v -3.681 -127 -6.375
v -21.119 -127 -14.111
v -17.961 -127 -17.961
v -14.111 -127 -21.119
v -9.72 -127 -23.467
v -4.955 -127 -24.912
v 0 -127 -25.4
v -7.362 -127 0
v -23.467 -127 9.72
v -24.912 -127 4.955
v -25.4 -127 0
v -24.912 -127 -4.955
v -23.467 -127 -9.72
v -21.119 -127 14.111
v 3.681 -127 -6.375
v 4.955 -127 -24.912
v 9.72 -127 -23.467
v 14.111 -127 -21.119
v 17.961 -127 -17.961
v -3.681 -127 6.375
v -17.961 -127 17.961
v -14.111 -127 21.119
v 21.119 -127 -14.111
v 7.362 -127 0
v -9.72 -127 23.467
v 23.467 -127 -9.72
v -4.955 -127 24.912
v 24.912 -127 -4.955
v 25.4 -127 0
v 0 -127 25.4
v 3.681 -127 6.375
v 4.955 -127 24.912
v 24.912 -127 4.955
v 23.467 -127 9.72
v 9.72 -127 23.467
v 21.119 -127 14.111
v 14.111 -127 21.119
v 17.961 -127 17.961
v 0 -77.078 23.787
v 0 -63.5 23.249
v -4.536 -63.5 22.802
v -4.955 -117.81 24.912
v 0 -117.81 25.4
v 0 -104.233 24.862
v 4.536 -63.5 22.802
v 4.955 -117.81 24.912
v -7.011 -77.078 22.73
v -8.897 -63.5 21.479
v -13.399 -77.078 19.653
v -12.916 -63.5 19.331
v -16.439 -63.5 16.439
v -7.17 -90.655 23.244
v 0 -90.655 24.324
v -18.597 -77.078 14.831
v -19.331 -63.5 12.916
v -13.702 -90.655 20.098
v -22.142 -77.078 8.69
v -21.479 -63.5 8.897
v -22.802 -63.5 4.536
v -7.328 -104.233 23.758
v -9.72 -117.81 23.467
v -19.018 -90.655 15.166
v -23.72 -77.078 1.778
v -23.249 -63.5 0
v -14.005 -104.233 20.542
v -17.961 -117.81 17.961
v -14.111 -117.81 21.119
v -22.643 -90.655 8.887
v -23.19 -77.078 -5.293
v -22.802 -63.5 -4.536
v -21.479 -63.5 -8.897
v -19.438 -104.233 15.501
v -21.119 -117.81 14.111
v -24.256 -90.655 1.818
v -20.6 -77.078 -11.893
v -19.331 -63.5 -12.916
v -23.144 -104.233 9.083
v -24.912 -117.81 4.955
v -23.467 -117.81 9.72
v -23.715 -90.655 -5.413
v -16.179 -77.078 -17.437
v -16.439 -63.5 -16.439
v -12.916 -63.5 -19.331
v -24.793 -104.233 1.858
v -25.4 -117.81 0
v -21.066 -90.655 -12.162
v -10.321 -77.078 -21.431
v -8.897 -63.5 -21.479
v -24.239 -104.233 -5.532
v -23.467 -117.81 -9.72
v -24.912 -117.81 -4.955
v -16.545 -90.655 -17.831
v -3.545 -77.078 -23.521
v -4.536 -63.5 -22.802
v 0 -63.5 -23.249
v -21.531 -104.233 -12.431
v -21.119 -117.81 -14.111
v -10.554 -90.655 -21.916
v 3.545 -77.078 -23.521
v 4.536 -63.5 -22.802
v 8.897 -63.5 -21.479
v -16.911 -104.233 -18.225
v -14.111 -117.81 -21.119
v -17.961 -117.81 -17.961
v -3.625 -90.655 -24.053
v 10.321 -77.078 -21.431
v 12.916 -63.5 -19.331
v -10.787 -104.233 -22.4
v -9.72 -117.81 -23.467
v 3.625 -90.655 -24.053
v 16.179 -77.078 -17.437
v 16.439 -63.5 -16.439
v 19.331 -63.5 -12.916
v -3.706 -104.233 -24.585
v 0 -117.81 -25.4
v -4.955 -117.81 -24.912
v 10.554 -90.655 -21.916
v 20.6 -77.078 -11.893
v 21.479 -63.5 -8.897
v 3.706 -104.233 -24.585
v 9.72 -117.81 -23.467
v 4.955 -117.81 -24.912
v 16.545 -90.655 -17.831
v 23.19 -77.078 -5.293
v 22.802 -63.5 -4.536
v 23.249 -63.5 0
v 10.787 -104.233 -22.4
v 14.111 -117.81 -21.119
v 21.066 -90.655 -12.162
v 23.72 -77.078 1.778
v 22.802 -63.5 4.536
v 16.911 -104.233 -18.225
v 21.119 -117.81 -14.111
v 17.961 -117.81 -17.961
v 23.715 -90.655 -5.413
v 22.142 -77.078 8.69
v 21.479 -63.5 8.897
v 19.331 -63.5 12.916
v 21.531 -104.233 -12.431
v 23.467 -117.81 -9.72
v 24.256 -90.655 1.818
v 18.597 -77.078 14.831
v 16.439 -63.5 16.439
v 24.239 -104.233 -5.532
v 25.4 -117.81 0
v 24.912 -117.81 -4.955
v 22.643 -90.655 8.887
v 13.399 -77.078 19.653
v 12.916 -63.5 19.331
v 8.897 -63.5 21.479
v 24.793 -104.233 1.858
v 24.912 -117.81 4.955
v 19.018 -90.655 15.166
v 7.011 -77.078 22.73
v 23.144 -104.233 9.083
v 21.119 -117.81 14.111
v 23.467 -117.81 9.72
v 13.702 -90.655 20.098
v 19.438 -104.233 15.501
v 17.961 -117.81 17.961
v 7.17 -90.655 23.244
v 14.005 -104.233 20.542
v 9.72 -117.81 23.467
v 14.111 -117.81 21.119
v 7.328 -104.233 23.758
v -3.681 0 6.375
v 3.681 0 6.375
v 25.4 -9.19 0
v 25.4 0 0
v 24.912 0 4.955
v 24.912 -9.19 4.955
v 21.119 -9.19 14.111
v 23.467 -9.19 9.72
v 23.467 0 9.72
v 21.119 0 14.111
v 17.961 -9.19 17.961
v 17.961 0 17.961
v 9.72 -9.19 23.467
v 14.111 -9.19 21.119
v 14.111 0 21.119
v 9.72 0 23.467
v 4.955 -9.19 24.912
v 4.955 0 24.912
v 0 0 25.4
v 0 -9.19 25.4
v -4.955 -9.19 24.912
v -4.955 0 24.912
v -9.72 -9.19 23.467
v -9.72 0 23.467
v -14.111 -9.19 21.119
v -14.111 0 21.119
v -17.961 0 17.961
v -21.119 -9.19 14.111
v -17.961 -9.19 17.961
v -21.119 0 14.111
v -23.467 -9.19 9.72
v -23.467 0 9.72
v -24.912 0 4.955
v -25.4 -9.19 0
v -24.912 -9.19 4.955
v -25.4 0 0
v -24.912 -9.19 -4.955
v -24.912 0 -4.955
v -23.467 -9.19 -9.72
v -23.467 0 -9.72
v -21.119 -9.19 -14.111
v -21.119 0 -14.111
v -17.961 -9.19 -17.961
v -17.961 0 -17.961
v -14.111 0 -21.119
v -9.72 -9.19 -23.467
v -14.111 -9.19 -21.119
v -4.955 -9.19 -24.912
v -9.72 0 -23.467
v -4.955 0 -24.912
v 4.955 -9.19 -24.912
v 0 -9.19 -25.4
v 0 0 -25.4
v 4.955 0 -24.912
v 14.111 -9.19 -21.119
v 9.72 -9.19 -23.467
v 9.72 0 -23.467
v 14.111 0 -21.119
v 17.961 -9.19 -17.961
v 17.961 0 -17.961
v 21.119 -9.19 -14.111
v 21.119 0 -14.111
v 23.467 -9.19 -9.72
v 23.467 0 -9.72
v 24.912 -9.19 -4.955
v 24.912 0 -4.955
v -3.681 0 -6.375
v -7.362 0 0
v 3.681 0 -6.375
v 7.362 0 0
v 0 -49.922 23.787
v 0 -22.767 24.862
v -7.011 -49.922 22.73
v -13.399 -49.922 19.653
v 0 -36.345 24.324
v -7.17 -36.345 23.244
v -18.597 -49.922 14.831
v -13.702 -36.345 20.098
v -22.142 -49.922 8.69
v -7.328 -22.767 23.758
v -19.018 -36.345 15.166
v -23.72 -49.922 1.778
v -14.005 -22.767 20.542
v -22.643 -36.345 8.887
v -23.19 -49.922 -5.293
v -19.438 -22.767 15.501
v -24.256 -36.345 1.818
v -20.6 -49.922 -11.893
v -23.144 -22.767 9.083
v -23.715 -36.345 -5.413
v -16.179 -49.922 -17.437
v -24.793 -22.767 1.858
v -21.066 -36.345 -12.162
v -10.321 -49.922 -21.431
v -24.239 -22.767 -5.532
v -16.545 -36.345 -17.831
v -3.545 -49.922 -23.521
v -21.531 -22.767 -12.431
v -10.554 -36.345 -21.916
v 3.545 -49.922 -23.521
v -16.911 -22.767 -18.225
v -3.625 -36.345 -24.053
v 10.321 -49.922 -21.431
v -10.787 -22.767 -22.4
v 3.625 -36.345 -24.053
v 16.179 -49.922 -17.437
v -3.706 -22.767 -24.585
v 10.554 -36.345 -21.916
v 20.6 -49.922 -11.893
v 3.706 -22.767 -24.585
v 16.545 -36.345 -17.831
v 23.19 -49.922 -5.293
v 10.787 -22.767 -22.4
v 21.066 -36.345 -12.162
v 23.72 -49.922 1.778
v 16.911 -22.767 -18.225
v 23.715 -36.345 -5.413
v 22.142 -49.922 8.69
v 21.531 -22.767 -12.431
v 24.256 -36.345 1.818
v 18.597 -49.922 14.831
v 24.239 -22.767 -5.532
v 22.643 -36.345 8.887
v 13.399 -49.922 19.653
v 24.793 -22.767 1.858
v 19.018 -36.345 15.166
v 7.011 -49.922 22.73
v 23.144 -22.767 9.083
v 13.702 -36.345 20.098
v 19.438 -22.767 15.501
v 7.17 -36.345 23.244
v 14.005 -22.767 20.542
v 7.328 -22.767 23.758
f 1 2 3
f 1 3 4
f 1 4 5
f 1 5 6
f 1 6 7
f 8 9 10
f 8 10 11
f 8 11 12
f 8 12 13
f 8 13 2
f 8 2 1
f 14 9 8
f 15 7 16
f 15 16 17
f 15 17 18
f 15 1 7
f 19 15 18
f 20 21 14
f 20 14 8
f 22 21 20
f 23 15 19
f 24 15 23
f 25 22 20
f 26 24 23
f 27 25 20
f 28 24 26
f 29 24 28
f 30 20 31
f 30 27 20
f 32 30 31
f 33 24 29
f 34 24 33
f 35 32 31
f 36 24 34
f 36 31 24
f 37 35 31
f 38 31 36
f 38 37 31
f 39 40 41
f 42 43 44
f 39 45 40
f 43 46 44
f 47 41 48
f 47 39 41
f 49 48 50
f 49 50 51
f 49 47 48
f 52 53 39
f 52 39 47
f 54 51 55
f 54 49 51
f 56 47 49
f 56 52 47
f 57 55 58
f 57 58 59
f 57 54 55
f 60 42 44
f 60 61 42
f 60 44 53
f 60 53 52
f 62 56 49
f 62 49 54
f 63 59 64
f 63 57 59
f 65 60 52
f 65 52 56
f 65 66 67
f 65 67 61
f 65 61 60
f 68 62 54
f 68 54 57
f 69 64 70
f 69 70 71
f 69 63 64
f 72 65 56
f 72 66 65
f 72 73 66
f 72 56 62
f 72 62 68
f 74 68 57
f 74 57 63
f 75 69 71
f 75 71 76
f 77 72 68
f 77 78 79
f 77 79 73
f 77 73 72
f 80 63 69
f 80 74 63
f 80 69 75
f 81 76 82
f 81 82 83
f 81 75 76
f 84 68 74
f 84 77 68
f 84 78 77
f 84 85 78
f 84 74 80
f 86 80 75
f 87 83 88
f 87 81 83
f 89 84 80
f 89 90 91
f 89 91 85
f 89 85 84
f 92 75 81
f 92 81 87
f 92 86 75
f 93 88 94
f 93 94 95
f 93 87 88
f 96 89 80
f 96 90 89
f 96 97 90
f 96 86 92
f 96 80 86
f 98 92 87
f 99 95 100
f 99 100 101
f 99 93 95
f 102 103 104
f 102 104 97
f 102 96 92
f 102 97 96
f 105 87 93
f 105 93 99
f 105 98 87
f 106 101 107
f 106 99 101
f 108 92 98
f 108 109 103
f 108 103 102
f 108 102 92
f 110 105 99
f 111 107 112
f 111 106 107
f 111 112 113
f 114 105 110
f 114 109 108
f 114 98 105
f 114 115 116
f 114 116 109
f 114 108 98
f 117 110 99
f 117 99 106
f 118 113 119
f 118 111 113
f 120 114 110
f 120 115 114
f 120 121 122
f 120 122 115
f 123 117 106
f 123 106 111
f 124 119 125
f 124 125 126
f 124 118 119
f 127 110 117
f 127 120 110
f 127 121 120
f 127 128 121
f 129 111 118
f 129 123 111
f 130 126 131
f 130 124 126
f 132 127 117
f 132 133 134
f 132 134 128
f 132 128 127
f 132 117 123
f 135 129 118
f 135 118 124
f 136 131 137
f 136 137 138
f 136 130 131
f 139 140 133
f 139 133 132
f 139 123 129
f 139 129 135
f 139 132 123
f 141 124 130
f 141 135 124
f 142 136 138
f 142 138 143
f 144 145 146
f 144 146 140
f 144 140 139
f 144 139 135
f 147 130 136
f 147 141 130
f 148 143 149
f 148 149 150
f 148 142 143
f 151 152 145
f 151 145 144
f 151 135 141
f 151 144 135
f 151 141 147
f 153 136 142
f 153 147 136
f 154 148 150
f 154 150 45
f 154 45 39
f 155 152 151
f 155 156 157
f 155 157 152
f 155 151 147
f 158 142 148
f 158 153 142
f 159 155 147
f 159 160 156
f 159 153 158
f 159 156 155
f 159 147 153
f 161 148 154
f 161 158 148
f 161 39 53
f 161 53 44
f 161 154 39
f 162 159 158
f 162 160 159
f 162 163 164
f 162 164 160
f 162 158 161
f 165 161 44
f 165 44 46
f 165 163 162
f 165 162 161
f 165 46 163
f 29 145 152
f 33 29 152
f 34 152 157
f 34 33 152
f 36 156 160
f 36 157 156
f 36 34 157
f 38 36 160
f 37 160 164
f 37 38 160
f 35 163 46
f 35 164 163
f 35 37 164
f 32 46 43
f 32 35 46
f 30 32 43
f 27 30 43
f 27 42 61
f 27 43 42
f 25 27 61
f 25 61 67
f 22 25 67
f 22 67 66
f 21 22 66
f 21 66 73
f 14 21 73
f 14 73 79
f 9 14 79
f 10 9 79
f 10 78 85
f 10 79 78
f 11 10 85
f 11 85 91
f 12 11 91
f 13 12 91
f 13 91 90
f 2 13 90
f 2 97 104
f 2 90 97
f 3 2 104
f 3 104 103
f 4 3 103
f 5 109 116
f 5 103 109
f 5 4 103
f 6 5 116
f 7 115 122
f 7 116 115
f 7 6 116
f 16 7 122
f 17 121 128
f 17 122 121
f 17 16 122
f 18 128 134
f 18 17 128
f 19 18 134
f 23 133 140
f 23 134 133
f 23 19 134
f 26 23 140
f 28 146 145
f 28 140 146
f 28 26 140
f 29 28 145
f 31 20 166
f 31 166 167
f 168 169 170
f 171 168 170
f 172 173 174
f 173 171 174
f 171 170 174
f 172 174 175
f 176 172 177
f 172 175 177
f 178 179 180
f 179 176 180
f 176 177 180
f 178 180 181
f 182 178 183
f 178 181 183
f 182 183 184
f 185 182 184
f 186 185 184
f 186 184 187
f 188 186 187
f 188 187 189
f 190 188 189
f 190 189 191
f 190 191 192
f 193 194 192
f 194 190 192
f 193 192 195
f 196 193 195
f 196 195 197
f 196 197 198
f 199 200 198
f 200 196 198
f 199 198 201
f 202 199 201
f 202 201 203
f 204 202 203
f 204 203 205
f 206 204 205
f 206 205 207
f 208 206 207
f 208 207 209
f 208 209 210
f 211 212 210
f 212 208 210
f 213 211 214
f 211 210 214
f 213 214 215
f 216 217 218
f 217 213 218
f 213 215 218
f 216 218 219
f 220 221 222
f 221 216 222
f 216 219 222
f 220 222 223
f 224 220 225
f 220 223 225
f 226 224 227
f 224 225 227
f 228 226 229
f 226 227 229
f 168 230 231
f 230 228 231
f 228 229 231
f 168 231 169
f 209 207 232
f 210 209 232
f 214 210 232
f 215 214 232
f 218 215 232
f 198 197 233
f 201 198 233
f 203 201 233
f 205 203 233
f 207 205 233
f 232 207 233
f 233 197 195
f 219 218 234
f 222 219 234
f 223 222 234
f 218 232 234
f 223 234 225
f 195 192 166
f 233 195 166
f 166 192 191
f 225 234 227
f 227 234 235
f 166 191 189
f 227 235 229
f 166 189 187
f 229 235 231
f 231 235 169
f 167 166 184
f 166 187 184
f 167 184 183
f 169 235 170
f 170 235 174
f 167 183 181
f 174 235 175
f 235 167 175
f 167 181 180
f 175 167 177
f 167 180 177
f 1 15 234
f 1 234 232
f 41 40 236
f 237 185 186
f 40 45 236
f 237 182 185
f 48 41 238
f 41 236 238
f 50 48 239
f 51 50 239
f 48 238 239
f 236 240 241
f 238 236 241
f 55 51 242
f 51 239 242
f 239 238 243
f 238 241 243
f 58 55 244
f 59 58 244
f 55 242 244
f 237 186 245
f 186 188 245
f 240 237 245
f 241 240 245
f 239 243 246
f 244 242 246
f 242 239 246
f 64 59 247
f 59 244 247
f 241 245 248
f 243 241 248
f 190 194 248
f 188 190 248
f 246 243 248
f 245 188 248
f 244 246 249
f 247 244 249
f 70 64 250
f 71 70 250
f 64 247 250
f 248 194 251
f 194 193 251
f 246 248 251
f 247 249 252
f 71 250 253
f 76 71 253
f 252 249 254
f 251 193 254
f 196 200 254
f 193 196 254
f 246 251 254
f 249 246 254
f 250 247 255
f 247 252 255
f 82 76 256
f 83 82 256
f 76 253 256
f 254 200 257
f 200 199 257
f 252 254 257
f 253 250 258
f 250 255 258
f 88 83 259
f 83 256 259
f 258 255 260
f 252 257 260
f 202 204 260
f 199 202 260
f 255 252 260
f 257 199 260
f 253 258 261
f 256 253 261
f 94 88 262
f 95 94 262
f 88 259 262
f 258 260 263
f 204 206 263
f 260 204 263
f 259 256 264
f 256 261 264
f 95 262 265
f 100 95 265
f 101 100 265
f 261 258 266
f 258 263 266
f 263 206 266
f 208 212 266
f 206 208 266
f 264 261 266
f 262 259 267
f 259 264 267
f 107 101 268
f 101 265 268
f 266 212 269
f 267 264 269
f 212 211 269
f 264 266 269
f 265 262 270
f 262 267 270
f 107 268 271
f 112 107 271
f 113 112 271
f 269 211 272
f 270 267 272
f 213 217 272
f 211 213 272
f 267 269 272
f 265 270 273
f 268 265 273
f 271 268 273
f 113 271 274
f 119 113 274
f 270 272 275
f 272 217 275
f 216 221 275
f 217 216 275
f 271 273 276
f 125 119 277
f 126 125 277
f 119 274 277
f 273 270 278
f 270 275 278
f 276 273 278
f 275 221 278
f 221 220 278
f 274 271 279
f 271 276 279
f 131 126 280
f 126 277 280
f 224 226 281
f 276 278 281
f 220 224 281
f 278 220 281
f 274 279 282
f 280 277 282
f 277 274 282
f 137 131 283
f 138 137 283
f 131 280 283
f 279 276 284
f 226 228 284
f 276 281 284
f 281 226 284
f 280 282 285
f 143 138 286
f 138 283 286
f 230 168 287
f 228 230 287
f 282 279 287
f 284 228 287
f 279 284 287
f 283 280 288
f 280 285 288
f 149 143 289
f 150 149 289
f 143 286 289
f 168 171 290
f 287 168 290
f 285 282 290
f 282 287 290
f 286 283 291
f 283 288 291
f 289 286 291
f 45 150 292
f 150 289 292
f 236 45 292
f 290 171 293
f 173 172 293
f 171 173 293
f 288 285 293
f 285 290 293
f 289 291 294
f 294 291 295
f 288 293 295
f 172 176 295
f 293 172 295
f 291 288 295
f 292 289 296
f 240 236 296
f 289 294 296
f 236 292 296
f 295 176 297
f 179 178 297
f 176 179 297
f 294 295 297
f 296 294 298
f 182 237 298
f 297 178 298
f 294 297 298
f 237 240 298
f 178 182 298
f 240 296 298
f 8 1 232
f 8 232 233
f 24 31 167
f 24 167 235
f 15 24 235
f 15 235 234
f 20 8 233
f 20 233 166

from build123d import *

# Parameters (mm, degrees)
F0_R     = 25.4
F1_DEPTH = 63.5


with BuildPart() as f1:
    # F0 (on Front) → F1 (new body)
    with BuildSketch(Plane.XZ):
        Circle(F0_R)
        Polygon((7.361678, 0), (3.680839, -6.3754), (-3.680839, -6.3754), (-7.361678, 0), (-3.680839, 6.3754), (3.680839, 6.3754), align=None, mode=Mode.SUBTRACT)
    extrude(amount=F1_DEPTH)

    # F2 (on Right) → F3 (revolve, cut)
    with BuildSketch(Plane.YZ):
        Polygon((-63.5, 25.606239), (-63.5, 23.248794), (-3.98305, 25.606239), align=None)
    revolve(axis=Axis((0, -31.75, 0), (0, -1, 0)), mode=Mode.SUBTRACT)

    # F5: F1 across plane


with BuildPart() as f1_1:
    add(f1.part)
    add(f1.part.mirror(Plane.XZ.offset(63.5)))


solid = f1_1.part
